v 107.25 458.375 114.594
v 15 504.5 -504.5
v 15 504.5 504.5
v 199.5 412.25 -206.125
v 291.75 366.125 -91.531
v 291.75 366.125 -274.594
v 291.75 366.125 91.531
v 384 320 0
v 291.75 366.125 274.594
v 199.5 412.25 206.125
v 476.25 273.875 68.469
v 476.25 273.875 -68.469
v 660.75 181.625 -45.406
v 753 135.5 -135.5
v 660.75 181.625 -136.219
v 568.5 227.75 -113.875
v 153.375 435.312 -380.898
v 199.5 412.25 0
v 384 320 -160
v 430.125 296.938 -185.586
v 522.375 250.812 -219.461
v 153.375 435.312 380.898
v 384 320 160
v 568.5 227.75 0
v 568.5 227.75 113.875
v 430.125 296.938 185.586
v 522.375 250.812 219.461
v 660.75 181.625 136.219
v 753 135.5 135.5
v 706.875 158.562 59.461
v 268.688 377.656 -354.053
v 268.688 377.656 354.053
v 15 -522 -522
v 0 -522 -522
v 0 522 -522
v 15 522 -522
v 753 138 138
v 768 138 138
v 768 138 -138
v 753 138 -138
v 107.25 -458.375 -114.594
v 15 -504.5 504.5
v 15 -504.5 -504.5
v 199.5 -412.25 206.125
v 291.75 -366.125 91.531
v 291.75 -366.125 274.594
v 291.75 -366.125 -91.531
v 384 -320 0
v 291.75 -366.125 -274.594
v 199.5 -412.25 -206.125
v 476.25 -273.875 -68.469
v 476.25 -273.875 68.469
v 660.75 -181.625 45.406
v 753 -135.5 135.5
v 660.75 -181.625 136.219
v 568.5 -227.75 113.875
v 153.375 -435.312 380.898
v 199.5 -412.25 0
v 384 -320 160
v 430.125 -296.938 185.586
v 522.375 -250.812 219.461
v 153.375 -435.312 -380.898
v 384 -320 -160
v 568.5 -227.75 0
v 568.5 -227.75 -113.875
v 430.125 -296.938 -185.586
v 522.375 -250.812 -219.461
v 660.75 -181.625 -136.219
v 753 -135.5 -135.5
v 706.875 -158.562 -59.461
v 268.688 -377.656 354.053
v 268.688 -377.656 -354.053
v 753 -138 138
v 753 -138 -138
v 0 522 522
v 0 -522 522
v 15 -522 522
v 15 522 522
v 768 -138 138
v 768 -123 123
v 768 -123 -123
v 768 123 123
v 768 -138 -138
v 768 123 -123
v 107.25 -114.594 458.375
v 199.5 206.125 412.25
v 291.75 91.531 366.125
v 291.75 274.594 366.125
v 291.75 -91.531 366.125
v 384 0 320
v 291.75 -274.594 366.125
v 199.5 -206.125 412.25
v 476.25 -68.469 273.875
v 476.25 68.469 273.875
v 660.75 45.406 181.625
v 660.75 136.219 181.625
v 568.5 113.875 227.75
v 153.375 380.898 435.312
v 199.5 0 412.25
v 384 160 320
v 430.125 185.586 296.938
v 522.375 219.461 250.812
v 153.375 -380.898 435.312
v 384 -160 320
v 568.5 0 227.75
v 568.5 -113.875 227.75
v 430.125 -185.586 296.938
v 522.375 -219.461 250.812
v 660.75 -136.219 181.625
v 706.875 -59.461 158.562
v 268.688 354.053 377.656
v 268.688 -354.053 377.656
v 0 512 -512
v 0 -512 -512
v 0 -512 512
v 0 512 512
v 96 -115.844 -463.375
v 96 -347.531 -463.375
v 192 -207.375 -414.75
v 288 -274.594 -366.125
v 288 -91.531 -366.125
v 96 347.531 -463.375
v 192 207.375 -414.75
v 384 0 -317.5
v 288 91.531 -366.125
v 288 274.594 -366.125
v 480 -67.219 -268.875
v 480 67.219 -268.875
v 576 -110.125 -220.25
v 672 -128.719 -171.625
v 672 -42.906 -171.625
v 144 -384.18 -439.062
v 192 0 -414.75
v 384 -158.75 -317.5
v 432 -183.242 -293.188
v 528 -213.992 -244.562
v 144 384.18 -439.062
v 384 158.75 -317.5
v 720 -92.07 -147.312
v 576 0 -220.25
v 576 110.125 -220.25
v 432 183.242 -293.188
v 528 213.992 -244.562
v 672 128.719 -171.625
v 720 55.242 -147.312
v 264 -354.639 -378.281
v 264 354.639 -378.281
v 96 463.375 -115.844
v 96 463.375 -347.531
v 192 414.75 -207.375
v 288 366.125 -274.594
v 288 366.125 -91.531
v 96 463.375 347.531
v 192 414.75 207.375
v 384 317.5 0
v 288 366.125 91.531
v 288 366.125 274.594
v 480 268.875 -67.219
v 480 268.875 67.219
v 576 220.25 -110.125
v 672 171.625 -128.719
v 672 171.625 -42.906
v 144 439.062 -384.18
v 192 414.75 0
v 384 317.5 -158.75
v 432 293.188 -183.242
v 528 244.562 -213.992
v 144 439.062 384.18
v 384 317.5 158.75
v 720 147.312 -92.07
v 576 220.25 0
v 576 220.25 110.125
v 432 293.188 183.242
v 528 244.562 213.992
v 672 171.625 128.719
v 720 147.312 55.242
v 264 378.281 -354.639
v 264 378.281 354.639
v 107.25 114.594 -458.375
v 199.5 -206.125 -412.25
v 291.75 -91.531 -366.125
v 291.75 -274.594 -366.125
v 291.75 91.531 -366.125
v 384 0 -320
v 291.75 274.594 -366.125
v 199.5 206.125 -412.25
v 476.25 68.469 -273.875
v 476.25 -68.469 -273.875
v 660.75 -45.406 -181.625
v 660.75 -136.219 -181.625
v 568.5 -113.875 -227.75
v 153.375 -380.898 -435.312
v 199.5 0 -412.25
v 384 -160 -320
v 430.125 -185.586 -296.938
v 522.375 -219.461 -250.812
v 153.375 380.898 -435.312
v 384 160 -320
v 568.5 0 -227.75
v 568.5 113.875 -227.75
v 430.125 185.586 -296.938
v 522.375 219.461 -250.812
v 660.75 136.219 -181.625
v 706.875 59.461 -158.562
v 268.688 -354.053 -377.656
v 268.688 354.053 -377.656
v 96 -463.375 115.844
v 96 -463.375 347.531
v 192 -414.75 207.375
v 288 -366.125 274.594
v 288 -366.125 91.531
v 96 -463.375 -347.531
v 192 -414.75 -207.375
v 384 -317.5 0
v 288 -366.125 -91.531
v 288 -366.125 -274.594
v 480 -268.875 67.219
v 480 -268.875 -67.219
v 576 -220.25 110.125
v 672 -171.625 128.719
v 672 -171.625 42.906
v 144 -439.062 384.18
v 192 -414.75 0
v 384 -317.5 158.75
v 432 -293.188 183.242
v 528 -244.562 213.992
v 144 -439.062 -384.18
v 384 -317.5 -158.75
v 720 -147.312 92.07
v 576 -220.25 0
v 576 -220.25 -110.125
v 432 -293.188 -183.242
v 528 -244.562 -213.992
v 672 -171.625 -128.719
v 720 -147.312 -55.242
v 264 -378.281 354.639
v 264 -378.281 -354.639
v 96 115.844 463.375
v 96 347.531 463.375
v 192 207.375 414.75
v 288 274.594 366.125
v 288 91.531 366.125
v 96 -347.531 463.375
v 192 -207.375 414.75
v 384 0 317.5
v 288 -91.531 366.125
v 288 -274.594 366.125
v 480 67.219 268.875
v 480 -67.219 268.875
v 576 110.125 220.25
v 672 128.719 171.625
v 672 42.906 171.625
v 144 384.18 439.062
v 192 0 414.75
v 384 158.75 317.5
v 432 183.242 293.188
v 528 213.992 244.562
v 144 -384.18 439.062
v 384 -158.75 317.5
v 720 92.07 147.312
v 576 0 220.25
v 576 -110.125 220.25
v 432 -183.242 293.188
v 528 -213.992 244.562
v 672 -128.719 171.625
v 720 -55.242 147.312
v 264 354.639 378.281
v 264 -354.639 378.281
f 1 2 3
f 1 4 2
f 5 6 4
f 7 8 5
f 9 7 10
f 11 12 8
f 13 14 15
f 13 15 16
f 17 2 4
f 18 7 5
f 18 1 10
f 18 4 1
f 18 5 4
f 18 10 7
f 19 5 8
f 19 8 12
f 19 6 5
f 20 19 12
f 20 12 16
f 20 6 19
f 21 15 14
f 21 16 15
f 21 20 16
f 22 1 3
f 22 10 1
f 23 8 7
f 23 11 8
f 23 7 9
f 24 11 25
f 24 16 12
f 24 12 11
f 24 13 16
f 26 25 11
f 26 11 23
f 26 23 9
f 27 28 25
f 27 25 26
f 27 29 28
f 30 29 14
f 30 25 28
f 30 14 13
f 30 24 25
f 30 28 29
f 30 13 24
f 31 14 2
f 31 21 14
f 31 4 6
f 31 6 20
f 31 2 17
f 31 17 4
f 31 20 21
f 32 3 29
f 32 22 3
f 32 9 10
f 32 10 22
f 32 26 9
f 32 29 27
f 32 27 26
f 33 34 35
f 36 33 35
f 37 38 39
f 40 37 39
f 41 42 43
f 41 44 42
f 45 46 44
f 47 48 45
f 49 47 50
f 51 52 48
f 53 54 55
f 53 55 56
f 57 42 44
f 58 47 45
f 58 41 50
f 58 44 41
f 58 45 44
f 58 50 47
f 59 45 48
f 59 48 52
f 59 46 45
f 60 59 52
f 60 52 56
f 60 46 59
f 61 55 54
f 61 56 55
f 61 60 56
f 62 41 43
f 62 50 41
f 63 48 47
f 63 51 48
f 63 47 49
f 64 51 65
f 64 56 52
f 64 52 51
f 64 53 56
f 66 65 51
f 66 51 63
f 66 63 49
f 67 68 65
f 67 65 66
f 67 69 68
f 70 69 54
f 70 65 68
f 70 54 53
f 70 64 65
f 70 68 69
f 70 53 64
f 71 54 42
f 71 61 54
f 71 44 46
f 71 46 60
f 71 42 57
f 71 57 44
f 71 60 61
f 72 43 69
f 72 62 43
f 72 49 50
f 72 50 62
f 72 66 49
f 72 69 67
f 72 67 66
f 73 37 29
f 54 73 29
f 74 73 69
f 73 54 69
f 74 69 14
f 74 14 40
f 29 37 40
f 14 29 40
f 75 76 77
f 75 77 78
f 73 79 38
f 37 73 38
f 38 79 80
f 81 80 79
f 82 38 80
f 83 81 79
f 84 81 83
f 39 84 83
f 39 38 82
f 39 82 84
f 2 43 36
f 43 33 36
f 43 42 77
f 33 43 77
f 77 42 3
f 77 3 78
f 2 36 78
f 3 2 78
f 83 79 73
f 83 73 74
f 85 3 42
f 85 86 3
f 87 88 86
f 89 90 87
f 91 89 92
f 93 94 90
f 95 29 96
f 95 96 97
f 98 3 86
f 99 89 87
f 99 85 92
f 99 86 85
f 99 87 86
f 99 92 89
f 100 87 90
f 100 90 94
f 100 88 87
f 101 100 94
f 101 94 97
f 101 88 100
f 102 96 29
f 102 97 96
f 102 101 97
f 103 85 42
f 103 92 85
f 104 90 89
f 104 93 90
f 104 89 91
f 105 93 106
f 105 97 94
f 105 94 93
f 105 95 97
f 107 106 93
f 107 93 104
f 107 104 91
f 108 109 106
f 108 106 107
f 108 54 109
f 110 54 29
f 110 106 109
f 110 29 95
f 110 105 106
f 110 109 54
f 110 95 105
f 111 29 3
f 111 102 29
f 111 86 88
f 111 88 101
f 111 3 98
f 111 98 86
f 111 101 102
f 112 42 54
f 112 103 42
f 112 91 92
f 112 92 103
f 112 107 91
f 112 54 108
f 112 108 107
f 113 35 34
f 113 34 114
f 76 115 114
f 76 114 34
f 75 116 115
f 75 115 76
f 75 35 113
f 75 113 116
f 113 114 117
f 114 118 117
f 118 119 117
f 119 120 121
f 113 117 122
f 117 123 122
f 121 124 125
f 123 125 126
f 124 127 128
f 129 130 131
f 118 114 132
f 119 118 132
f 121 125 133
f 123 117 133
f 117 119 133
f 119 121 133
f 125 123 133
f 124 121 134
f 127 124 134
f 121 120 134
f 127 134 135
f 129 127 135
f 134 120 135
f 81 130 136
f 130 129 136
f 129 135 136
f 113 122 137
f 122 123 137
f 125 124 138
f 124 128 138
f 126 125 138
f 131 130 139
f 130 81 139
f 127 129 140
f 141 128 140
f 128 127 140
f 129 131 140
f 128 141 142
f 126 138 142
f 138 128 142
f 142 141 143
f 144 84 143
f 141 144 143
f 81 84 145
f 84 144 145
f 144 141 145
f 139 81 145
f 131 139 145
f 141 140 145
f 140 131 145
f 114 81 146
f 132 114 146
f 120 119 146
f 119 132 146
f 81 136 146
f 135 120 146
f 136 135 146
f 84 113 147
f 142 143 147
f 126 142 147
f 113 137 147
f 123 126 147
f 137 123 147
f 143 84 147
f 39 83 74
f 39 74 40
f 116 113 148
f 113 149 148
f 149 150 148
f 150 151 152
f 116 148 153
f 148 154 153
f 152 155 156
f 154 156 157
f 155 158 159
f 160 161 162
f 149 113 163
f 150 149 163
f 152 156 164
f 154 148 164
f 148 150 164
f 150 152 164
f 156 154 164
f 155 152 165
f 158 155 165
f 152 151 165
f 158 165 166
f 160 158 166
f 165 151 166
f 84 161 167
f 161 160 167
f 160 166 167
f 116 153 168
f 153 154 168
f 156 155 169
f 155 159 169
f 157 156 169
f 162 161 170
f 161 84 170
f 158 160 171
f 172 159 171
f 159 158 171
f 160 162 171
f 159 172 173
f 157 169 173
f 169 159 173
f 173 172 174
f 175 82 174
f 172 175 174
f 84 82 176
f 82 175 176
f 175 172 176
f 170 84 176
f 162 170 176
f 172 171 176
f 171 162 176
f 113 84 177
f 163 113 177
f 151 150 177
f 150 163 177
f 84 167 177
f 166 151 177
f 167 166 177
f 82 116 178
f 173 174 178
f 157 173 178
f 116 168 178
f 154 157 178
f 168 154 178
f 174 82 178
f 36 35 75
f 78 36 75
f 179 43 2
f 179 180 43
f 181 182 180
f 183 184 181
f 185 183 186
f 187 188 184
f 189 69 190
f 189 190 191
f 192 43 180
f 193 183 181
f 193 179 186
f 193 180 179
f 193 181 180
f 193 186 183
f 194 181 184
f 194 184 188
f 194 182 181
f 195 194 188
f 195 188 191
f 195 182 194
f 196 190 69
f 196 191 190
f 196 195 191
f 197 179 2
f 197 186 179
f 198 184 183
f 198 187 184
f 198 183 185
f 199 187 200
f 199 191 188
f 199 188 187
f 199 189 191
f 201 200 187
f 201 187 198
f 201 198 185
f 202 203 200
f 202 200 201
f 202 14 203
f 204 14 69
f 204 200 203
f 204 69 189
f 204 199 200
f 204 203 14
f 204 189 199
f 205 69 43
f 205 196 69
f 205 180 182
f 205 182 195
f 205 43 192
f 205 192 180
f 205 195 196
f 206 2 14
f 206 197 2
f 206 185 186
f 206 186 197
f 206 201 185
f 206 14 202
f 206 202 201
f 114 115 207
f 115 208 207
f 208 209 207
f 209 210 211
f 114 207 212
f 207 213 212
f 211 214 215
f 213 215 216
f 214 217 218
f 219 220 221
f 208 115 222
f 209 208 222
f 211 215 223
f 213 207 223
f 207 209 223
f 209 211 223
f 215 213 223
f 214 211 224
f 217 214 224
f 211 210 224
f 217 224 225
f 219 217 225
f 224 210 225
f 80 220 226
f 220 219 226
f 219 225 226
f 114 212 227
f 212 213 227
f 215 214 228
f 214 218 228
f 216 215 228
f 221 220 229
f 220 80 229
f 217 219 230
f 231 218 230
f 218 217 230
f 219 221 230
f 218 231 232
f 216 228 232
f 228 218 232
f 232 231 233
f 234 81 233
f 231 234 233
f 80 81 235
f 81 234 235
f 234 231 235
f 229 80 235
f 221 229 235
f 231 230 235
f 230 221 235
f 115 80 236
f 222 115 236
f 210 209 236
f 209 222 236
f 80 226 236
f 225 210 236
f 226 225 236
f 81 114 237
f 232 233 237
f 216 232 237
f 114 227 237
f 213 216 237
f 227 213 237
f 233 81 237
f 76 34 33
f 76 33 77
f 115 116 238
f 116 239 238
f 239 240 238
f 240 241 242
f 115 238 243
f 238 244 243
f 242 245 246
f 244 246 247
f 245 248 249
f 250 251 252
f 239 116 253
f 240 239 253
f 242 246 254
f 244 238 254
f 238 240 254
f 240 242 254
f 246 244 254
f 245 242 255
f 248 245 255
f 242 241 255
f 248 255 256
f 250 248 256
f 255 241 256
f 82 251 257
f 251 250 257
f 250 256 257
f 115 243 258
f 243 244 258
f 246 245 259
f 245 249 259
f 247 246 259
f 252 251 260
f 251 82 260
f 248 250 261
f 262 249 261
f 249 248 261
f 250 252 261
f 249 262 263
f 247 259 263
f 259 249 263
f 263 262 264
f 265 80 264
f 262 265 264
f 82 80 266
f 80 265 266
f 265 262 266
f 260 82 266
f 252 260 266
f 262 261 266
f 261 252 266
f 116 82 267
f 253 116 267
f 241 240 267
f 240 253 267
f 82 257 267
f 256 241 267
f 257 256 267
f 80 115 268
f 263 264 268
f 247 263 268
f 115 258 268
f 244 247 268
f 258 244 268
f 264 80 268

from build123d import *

# Parameters (mm, degrees)
SKETCH11_W          = 276
SKETCH11_H          = 276
BOSS_EXTRUDE7_DEPTH = 15
SKETCH12_W          = 1044
SKETCH12_H          = 1044
BOSS_EXTRUDE8_DEPTH = 15


with BuildPart() as part:
    # Sketch1 → Loft3 section 0
    with BuildSketch(Plane(origin=(0, 0, 0), x_dir=(0, 0, -1), z_dir=(1, 0, 0))):
        with BuildLine():
            Line((-512, -512), (512, -512))
            Line((512, -512), (512, 512))
            Line((512, 512), (-512, 512))
            Line((-512, 512), (-512, -512))
        make_face()
    # Sketch2 → Loft3 section 1
    with BuildSketch(Plane(origin=(768, 0, 0), x_dir=(0, 0, -1), z_dir=(1, 0, 0))):
        with BuildLine():
            Line((-128, 128), (128, 128))
            Line((128, 128), (128, -128))
            Line((128, -128), (-128, -128))
            Line((-128, -128), (-128, 128))
        make_face()
    loft()

    # Sketch11 → Boss-Extrude7 (add)
    with BuildSketch(Plane(origin=(768, 0, 0), x_dir=(0, 0, -1), z_dir=(1, 0, 0))):
        Rectangle(SKETCH11_W, SKETCH11_H)
    extrude(amount=-BOSS_EXTRUDE7_DEPTH)

    # Sketch12 → Boss-Extrude8 (add)
    with BuildSketch(Plane.ZY):
        Rectangle(SKETCH12_W, SKETCH12_H)
    extrude(amount=-BOSS_EXTRUDE8_DEPTH)

    # Sketch13 → Cut-Loft4 section 0
    with BuildSketch(Plane.ZY):
        with BuildLine():
            Line((-512, 512), (512, 512))
            Line((512, 512), (512, -512))
            Line((512, -512), (-512, -512))
            Line((-512, -512), (-512, 512))
        make_face()
    # Sketch3 → Cut-Loft4 section 1
    with BuildSketch(Plane(origin=(768, 0, 0), x_dir=(0, 0, -1), z_dir=(1, 0, 0))):
        with BuildLine():
            Line((-123, 123), (123, 123))
            Line((123, 123), (123, -123))
            Line((123, -123), (-123, -123))
            Line((-123, -123), (-123, 123))
        make_face()
    loft(mode=Mode.SUBTRACT)


solid = part.part
